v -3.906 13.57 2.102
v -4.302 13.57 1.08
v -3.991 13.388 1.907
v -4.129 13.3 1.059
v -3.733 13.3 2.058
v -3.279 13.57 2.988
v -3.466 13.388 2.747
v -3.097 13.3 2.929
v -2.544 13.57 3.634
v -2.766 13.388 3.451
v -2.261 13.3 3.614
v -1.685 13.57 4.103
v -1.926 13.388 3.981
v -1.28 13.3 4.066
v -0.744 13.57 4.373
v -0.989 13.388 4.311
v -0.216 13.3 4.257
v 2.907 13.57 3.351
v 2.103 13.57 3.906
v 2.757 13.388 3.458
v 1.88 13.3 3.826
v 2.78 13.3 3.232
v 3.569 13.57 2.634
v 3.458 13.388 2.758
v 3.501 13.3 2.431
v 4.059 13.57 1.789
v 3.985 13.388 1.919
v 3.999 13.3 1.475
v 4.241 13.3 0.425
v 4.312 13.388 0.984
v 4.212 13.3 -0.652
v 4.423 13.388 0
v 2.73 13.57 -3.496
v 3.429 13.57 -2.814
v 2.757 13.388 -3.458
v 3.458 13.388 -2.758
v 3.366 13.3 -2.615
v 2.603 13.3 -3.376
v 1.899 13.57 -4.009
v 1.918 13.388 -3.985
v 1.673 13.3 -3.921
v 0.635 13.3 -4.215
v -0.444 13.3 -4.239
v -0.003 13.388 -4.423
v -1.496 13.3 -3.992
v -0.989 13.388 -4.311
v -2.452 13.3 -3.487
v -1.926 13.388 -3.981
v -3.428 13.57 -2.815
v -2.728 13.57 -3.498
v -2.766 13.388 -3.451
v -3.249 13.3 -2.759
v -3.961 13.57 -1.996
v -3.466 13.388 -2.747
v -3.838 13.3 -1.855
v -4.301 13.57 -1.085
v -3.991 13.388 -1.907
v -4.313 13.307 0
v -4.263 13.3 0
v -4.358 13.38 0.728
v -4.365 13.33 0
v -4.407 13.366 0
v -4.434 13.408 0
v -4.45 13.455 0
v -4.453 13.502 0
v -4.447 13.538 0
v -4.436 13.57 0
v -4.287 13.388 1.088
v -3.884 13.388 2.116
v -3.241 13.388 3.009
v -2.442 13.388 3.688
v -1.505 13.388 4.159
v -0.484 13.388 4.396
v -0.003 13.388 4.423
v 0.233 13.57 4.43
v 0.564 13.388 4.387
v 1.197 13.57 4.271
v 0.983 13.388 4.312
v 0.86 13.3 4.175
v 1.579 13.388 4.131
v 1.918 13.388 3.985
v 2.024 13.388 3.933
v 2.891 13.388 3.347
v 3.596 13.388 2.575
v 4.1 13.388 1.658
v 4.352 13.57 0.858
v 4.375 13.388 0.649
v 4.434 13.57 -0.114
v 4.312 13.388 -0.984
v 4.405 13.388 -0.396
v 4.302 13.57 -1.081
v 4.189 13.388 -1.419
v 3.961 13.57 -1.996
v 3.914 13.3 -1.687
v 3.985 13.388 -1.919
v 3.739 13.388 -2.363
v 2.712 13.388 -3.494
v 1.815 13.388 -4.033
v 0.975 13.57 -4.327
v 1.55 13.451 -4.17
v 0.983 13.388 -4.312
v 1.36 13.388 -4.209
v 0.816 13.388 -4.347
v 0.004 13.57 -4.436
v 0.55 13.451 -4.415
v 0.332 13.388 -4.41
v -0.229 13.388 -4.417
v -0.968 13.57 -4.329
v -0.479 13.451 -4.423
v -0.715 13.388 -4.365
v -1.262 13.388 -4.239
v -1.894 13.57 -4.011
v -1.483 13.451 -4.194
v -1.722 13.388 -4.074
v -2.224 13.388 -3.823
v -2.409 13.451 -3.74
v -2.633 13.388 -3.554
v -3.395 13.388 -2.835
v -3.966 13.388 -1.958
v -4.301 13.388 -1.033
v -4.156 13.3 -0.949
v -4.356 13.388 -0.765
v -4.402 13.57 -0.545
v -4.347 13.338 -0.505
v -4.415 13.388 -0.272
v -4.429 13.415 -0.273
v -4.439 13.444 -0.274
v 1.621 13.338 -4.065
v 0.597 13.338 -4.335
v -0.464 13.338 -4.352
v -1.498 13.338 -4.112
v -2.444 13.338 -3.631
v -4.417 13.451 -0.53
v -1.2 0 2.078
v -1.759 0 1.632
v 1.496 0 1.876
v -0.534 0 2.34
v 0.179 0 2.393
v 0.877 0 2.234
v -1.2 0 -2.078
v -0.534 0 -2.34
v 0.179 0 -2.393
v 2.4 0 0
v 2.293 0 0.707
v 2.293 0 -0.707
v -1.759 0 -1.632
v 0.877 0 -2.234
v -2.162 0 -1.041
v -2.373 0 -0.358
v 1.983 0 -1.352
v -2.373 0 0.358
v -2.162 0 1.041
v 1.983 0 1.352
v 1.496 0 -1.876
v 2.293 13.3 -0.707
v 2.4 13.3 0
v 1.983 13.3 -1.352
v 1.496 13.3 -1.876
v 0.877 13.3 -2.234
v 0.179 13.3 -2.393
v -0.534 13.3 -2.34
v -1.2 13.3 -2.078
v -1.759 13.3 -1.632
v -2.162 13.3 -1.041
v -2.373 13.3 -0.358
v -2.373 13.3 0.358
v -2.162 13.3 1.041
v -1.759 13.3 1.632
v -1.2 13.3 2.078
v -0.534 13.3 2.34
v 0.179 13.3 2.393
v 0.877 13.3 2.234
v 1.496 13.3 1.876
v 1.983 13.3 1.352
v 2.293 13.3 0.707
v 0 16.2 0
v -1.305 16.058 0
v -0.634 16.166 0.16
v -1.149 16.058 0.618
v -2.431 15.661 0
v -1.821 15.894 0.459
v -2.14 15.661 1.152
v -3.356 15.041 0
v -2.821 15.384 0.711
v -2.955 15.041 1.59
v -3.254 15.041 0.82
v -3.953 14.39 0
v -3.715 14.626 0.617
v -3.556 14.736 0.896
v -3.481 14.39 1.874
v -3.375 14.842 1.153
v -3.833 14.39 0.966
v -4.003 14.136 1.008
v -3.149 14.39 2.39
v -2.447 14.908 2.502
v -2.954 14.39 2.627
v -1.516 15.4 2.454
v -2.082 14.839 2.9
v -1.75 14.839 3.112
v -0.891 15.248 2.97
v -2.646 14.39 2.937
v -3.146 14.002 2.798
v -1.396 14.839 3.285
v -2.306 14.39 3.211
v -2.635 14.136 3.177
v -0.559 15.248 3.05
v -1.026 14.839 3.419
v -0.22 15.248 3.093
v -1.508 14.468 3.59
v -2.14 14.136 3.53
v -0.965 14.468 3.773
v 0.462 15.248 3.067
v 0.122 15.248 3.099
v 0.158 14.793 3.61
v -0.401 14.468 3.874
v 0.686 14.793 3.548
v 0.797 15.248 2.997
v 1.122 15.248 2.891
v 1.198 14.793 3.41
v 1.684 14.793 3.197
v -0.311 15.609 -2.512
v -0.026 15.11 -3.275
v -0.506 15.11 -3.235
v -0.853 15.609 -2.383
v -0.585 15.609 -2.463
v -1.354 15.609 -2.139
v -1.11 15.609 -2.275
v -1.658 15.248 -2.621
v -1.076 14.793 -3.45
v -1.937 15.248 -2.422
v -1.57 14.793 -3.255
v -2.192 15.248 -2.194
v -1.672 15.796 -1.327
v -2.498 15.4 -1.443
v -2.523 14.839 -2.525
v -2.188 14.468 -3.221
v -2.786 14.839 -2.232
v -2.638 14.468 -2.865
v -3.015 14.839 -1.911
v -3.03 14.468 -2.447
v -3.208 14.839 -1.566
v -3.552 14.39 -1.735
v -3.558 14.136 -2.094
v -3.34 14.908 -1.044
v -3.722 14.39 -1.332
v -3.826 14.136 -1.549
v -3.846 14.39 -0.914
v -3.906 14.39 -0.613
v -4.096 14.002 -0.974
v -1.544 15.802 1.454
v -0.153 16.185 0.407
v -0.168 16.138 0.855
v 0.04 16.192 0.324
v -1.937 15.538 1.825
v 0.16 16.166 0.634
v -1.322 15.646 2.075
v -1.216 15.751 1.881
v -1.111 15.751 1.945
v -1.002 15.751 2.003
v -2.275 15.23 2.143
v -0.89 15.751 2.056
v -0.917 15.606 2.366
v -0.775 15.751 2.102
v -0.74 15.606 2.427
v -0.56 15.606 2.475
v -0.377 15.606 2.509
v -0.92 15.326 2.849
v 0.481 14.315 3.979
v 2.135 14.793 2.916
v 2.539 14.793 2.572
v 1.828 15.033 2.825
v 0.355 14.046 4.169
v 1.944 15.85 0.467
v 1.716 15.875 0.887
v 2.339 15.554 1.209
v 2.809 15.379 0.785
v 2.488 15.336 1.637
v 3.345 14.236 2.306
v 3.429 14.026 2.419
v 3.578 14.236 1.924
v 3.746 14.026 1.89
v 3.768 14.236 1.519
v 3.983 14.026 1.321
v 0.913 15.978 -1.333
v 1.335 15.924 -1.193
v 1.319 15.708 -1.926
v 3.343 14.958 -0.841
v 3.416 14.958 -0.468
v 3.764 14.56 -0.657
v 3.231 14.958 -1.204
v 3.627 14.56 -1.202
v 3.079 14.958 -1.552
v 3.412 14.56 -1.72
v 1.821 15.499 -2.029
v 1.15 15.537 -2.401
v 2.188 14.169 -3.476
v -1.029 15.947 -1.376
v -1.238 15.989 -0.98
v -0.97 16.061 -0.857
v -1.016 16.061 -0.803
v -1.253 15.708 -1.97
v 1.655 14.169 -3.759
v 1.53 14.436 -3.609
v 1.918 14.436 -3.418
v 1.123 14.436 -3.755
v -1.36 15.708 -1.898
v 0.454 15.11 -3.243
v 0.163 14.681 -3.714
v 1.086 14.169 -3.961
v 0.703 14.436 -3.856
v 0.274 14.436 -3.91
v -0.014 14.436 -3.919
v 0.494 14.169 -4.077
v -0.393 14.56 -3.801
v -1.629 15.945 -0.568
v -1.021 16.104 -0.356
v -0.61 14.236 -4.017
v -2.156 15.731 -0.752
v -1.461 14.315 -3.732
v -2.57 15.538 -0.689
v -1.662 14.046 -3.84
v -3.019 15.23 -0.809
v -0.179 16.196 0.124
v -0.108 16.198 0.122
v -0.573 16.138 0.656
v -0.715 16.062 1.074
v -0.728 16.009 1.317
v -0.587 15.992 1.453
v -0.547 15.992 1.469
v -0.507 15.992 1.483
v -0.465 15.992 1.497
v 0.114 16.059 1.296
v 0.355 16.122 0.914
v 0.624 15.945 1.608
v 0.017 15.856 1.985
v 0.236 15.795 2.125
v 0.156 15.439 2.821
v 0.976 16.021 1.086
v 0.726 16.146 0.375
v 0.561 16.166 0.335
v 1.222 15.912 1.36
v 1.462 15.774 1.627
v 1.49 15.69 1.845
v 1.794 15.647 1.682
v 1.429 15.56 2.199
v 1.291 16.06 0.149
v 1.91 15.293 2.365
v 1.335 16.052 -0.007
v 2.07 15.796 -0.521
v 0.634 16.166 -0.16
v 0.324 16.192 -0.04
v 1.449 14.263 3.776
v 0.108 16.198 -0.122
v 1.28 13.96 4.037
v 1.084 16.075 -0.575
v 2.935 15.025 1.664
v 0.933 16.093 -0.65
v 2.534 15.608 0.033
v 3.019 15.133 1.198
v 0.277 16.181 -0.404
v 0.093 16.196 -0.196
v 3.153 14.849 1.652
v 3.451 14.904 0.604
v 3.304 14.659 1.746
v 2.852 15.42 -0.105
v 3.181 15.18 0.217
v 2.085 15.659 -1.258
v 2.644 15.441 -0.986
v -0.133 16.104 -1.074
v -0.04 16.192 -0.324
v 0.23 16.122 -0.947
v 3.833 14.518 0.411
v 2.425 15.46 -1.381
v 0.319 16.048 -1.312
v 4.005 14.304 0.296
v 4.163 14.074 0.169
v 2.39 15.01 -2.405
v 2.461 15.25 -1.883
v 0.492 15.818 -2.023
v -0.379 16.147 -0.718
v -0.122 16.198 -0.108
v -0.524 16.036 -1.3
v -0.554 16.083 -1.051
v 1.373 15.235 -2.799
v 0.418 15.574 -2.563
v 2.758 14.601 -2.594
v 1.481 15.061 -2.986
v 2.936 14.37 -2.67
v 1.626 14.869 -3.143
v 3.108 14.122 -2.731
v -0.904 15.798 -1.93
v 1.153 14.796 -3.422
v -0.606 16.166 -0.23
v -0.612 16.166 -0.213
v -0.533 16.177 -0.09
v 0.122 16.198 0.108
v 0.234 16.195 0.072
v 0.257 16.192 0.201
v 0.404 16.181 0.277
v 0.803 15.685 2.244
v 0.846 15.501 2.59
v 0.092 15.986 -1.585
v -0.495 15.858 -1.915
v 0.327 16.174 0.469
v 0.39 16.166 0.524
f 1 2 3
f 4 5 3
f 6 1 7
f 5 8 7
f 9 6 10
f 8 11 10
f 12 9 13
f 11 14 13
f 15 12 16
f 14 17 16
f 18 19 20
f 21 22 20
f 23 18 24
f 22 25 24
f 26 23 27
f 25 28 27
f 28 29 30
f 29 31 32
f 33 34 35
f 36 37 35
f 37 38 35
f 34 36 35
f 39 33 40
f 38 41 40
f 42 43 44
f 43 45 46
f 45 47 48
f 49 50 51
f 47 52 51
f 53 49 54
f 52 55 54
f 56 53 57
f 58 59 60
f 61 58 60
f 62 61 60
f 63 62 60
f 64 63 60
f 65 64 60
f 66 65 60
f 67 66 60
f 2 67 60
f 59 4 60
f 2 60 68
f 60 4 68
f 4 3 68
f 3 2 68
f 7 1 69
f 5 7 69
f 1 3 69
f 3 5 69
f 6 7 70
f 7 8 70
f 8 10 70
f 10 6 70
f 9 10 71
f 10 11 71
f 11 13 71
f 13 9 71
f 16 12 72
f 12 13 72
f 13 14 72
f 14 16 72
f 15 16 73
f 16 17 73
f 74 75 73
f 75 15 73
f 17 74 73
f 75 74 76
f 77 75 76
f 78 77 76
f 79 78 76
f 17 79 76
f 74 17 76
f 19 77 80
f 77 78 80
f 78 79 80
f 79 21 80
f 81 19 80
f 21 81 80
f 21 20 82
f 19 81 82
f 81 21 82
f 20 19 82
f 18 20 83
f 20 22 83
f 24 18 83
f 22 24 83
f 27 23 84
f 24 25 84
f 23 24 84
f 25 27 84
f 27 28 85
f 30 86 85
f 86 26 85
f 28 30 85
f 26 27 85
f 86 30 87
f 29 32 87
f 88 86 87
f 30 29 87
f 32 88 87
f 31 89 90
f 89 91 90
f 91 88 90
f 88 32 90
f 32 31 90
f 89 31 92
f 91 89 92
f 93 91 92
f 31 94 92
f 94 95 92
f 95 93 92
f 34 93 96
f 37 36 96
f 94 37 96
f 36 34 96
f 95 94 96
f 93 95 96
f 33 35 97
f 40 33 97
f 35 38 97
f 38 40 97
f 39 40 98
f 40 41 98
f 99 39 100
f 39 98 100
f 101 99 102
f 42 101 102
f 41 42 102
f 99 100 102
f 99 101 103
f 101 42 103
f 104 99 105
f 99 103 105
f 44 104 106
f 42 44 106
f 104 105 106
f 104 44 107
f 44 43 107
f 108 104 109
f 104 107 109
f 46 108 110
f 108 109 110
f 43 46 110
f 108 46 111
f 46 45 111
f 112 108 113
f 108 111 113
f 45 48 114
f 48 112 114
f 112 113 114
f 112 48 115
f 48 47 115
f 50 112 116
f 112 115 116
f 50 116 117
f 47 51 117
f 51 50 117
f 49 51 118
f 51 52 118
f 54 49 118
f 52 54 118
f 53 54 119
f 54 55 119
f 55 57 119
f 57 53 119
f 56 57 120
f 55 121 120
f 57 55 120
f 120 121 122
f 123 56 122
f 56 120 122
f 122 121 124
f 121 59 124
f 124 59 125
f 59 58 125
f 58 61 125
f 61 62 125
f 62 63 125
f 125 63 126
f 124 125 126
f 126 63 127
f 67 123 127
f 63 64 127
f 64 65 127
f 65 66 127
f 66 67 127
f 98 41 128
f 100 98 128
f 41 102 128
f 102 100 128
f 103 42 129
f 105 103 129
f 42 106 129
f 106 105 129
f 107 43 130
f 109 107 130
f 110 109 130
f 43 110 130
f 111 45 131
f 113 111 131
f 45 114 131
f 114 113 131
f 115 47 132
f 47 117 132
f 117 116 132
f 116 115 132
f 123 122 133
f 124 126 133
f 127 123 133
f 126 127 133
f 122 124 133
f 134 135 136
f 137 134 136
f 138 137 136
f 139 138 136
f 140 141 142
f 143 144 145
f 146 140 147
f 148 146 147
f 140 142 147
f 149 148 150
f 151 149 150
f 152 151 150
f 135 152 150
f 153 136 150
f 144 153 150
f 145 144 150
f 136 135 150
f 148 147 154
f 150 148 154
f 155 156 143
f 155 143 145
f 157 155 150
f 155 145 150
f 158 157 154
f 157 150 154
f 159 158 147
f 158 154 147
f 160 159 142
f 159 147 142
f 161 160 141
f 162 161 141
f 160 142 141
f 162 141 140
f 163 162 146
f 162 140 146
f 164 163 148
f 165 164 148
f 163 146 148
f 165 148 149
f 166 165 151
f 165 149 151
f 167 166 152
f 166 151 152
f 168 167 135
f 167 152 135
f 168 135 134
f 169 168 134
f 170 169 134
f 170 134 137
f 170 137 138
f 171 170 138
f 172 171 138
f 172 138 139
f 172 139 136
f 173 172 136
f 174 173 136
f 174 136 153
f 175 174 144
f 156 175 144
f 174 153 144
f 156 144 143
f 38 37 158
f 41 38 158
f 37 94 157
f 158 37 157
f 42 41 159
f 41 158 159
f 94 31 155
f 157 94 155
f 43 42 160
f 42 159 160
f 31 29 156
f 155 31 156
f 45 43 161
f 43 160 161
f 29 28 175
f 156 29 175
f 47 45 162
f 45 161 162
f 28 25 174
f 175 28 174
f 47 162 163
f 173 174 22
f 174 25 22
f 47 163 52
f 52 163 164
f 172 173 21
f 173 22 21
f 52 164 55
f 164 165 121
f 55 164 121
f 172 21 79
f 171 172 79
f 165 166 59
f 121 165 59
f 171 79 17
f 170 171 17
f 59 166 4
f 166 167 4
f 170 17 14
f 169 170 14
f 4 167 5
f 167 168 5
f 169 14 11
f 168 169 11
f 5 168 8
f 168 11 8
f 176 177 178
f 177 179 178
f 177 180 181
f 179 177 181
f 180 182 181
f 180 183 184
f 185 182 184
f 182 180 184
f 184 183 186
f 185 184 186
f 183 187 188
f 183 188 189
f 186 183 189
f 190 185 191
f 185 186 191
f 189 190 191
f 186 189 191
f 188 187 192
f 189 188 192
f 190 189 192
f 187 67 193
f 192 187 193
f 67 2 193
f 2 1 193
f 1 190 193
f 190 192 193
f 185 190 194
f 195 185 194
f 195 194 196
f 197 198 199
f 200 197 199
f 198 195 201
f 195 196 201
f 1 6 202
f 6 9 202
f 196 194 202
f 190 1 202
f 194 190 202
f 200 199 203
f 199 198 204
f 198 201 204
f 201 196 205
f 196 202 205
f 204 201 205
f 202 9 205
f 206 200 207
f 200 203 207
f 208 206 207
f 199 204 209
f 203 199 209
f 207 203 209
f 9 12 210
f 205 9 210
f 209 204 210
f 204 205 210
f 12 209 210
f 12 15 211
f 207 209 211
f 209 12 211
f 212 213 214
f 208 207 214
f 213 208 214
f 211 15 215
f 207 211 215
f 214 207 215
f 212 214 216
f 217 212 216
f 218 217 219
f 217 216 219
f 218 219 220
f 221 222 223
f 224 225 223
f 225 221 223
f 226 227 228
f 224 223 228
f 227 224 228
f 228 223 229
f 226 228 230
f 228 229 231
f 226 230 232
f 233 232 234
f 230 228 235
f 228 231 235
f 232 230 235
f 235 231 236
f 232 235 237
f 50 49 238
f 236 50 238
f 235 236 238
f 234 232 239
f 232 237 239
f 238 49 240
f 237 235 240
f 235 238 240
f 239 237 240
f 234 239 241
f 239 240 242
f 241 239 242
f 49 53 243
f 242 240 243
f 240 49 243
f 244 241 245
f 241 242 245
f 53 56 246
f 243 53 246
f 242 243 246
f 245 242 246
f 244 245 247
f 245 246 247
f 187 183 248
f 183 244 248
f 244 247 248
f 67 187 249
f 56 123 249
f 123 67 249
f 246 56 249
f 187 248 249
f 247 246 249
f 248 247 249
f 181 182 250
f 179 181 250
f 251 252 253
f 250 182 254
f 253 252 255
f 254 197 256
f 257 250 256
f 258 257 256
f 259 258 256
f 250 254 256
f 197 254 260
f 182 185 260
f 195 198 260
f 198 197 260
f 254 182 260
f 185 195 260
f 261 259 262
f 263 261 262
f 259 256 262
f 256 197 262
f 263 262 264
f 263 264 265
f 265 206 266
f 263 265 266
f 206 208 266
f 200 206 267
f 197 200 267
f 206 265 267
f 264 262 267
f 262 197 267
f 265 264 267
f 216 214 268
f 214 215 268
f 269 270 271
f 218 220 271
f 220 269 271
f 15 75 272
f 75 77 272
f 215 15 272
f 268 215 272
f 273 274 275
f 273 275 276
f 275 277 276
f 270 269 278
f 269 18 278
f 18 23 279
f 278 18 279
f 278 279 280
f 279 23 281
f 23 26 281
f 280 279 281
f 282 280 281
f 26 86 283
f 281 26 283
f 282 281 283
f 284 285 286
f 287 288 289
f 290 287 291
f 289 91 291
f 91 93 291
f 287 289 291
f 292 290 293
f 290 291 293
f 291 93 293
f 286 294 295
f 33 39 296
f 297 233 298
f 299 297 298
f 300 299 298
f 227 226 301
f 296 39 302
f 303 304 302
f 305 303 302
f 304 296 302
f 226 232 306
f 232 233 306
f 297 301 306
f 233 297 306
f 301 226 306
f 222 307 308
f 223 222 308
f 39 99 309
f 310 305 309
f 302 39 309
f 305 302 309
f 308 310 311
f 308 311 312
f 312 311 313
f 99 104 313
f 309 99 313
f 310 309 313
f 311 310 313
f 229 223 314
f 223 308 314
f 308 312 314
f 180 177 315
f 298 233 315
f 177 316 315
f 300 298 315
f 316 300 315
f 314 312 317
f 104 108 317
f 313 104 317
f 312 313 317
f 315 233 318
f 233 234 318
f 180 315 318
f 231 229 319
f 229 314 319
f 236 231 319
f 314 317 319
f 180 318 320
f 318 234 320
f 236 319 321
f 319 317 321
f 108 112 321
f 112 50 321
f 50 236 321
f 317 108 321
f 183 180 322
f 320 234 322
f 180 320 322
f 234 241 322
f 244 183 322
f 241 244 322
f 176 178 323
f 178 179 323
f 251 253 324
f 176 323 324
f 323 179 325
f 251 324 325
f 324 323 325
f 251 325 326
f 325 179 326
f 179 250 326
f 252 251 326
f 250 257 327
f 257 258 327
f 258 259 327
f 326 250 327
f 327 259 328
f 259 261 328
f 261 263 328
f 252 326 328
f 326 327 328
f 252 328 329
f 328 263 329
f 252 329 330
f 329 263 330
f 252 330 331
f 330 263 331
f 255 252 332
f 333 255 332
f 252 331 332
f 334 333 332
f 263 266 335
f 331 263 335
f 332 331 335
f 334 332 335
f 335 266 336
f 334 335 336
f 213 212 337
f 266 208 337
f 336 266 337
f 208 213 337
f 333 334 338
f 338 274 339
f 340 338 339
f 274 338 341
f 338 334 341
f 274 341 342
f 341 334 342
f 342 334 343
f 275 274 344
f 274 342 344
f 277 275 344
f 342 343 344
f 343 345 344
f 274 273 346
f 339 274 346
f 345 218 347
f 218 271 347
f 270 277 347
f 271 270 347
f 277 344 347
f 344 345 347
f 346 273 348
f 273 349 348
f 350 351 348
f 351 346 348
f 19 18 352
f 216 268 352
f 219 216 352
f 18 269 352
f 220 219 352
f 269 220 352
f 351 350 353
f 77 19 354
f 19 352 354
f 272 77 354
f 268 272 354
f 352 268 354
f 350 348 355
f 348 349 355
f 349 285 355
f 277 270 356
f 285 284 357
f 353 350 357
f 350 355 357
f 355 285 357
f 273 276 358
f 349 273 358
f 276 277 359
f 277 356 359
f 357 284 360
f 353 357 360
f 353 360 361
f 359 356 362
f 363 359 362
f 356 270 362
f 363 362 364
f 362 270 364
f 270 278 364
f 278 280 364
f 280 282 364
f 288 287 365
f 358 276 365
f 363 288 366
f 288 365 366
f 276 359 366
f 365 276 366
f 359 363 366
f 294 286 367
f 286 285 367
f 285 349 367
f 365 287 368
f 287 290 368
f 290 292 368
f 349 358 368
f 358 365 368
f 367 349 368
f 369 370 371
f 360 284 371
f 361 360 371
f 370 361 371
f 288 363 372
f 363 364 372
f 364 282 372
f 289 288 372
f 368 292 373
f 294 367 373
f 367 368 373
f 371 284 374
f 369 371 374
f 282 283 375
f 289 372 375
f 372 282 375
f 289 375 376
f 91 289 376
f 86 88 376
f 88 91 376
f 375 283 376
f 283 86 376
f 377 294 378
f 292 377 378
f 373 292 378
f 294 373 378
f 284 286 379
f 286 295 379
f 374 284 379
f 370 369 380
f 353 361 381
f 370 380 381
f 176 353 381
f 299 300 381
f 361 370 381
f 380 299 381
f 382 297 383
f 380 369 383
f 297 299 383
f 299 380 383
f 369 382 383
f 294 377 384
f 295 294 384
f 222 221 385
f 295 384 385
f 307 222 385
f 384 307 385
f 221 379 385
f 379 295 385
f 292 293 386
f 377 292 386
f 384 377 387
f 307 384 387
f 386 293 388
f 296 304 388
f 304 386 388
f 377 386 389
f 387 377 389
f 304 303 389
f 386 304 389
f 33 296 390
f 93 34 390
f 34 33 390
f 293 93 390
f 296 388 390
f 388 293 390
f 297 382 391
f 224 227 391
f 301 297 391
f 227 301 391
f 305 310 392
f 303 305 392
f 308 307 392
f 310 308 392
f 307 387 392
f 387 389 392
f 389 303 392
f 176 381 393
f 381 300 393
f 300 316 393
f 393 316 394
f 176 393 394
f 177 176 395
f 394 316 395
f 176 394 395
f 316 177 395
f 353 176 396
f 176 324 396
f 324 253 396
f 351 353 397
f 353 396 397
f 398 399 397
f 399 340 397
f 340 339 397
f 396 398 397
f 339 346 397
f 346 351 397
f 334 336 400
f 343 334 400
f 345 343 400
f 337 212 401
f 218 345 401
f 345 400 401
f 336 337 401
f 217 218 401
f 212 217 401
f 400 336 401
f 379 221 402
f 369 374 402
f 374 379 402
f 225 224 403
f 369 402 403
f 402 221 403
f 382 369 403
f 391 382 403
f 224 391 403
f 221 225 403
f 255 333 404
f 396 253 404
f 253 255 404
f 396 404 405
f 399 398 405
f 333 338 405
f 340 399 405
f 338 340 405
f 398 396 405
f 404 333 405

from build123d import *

# Parameters (mm, degrees)
SKETCH1_R           = 2.4
BOSS_EXTRUDE1_DEPTH = 13.3
FILLET1_R           = 0.1905


with BuildPart() as part:
    # Sketch1 → Boss-Extrude1 (new body)
    with BuildSketch(Plane(origin=(0, 0, 0), x_dir=(1, 0, 0), z_dir=(0, 1, 0))):
        Circle(SKETCH1_R)
    extrude(amount=BOSS_EXTRUDE1_DEPTH)

    # Sketch2 → Revolve1 (revolve)
    with BuildSketch(Plane.XY):
        with BuildLine():
            Line((-4.55, 13.3), (0, 13.3))
            Line((0, 13.3), (0, 16.2))
            add(Edge.make_bspline(
                [(0, 16.2), (-1.798533353, 16.2), (-3.716538693, 15.437253148), (-4.55, 13.3)],
                knots=[0, 0, 0, 0, 1, 1, 1, 1], degree=3))
        make_face()
    revolve(axis=Axis((0, 13.3, 0), (0, 1, 0)))

    # Fillet1
    fillet1_edges = [part.edges().sort_by_distance(p)[0] for p in [
        (4.55, 13.3, 0),
    ]]
    fillet(fillet1_edges, radius=FILLET1_R)


solid = part.part
